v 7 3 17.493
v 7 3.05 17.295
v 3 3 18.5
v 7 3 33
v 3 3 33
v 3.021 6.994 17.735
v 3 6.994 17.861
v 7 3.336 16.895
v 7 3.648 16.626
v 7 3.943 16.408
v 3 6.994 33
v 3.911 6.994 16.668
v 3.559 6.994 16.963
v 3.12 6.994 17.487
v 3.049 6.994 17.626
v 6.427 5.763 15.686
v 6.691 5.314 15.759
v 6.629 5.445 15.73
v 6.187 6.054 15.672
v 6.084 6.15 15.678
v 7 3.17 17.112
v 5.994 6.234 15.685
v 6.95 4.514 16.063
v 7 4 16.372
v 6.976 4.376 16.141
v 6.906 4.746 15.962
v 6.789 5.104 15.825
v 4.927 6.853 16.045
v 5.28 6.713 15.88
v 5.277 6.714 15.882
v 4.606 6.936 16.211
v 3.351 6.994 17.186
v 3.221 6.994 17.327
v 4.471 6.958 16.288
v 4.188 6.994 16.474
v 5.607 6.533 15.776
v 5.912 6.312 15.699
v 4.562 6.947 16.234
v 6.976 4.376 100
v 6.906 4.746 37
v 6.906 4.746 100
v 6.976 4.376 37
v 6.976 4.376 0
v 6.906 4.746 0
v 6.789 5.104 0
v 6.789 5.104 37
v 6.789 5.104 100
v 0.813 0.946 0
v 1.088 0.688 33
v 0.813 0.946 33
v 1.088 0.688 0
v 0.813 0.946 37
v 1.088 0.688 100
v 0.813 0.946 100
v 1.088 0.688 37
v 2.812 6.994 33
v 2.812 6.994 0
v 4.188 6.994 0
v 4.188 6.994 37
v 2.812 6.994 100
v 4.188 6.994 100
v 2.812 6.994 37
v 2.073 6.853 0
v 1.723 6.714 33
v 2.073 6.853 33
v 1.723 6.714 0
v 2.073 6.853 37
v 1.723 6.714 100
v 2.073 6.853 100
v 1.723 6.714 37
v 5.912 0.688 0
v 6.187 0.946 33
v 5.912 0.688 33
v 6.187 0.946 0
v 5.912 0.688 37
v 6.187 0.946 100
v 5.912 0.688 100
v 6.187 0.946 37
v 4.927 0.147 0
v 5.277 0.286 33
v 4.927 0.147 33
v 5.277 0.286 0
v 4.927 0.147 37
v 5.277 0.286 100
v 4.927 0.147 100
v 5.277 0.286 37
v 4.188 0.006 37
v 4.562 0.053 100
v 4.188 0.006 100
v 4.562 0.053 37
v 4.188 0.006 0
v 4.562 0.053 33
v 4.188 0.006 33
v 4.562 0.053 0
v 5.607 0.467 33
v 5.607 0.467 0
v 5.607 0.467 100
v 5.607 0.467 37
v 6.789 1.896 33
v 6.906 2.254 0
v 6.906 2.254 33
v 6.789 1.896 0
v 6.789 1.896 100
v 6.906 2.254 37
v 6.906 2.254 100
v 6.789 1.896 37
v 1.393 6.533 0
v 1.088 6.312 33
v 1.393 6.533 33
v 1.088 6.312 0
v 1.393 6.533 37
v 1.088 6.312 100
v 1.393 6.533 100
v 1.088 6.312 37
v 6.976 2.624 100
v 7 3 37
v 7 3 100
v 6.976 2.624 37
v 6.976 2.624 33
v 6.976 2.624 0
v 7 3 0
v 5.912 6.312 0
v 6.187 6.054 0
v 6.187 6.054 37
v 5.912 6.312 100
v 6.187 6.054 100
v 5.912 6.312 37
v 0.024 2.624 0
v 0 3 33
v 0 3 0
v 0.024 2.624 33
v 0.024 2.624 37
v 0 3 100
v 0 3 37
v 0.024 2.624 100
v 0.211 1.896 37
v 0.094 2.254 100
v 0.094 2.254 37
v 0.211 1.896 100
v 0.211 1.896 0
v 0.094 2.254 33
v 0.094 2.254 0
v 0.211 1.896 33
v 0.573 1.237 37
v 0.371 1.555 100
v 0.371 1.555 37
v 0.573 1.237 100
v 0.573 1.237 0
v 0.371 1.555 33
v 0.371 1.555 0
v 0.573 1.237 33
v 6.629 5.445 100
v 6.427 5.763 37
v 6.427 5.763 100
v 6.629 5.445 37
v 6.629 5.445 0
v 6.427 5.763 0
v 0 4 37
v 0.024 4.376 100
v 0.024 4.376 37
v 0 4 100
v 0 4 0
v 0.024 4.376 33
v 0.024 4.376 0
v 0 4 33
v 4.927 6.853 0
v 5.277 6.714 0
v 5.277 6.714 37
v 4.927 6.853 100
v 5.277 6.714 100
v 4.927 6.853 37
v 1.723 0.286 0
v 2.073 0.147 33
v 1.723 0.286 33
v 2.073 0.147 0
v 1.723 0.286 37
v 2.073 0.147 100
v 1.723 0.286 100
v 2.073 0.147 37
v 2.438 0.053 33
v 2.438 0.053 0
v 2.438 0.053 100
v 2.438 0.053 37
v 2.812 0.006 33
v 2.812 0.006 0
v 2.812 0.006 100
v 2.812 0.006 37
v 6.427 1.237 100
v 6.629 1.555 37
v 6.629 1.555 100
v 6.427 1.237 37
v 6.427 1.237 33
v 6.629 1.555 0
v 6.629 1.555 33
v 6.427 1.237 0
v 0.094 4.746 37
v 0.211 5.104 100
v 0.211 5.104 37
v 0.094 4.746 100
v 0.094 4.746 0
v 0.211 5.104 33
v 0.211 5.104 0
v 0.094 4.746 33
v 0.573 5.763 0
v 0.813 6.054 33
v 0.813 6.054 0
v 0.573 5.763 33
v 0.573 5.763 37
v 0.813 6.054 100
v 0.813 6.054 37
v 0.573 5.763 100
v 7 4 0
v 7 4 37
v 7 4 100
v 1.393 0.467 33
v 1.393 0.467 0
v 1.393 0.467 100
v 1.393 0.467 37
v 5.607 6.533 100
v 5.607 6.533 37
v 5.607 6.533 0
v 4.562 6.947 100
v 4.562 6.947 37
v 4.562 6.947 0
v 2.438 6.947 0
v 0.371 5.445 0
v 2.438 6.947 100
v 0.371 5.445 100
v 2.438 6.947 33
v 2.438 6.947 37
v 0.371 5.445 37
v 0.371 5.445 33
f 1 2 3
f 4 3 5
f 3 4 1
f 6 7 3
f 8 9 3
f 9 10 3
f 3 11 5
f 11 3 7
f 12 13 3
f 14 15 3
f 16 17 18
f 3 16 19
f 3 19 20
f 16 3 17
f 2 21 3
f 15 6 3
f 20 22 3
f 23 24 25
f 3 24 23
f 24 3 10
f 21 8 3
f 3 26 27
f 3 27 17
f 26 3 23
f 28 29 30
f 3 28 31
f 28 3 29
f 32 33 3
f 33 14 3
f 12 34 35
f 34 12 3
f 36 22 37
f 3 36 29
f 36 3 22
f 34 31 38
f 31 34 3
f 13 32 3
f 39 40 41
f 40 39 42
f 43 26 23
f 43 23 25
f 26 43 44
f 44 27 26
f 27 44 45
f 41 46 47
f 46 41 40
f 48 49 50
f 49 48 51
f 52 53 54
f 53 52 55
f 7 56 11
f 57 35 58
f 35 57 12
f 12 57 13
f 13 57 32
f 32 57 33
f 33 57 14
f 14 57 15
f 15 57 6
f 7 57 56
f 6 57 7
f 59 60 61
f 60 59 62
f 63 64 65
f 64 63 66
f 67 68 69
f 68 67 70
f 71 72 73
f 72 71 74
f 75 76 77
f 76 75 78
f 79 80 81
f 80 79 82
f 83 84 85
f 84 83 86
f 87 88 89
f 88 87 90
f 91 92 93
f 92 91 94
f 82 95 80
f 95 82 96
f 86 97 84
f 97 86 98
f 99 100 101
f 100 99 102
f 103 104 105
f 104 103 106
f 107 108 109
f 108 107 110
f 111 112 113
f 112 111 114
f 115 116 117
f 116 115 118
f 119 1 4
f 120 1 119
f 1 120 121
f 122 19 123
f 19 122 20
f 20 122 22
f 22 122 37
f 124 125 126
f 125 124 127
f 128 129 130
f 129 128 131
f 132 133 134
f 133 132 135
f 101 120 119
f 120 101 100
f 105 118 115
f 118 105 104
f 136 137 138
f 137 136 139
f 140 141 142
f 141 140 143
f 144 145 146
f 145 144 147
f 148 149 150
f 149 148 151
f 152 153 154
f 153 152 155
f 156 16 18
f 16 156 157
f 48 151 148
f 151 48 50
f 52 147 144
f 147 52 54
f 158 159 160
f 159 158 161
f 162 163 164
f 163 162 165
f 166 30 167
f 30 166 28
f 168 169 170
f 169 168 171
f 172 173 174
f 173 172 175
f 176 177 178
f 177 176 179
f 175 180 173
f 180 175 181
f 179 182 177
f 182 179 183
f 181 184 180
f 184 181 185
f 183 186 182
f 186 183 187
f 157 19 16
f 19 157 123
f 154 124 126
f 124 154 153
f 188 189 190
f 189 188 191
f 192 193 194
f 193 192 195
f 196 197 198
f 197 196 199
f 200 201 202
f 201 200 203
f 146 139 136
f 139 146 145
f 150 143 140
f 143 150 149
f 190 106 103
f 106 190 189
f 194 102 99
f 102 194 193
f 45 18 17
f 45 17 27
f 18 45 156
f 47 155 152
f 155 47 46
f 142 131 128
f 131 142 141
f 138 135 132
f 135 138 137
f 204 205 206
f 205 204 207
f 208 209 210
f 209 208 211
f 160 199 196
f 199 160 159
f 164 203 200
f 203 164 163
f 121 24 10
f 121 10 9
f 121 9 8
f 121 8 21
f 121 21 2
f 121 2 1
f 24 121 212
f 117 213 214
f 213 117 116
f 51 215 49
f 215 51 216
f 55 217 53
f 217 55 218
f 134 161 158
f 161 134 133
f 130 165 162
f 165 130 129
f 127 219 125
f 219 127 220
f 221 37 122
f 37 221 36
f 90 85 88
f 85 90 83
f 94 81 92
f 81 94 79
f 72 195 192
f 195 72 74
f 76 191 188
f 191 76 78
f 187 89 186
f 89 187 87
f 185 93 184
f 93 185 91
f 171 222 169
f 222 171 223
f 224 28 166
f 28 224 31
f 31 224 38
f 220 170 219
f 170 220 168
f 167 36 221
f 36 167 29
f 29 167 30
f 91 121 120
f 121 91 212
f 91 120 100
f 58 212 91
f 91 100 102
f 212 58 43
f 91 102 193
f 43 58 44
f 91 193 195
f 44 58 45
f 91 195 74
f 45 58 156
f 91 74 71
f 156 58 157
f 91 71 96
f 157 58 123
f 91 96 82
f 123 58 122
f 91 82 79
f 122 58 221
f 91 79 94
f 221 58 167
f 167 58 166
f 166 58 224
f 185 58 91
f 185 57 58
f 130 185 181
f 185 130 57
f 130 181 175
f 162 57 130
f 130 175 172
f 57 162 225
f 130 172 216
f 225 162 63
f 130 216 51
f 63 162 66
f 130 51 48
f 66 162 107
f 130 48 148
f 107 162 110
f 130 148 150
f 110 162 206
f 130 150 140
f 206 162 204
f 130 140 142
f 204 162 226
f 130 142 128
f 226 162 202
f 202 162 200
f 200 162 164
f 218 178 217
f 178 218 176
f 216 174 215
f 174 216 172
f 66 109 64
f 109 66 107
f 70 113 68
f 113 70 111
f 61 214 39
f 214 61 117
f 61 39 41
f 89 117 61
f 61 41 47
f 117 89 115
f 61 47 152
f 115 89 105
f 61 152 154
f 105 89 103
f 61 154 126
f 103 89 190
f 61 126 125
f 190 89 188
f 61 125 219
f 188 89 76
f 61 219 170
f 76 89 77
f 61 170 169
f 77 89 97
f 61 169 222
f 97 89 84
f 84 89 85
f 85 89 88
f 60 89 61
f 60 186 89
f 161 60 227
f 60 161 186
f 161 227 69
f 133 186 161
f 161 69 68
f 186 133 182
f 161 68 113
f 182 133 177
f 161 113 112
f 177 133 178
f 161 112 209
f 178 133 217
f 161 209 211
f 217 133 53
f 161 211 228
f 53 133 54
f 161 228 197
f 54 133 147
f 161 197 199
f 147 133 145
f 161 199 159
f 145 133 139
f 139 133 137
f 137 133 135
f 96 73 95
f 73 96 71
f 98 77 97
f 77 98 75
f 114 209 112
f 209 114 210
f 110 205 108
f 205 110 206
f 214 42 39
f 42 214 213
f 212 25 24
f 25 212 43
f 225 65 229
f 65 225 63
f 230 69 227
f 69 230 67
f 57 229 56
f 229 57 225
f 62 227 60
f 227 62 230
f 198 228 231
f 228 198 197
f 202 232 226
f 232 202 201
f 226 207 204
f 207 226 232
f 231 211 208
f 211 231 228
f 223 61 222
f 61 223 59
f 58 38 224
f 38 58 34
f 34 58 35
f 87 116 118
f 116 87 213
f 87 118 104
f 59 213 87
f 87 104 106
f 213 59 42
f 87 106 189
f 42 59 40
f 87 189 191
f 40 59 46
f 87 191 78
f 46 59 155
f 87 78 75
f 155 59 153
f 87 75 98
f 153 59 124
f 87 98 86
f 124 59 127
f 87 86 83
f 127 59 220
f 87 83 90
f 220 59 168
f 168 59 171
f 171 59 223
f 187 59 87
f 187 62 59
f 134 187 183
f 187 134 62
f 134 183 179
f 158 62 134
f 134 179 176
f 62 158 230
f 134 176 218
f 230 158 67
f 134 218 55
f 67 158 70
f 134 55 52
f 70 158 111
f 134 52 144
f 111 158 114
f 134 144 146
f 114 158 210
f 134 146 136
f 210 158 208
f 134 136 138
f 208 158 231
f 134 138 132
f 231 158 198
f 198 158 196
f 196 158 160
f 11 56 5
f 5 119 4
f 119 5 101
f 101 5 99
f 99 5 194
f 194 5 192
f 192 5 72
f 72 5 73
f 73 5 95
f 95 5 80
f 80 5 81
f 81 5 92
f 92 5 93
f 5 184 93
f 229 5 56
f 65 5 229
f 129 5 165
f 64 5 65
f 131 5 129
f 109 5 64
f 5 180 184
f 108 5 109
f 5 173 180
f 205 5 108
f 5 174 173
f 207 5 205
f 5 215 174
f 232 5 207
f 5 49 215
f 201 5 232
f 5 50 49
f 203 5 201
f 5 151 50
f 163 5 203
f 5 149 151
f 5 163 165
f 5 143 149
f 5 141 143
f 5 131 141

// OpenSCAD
// file: ../../lib/rounded_square.scad
$bleed = 1;
$rounding = 3;

module rounded_square(size) {
  inner_size = [
    size[0] - $rounding * 2,
    size[1] - $rounding * 2,
  ];

  minkowski() {
    translate([$rounding, $rounding, 0]) {
      square(inner_size);
    }
    circle($rounding);
  }
}
// file: ../../lib/util_functions.scad
function sum(v) = [for(p = v) 1] * v;

function take_sum(v, i) = i == 0 
  ? 0 
  : sum([for (a = [0:i-1]) v[a]]);

// input : nested list
// output : list with the outer level nesting removed
function flatten(l) = [ for (a = l) for (b = a) b ] ;
// file: ../../lib/rounded_cube.scad
include <./rounded_square.scad>

$bleed = 1;
$rounding = 3;

// Render a rounded cube
// flat_top: do not round the top edges
// flat_bottom: do not round the bottom edges
// flat: equals flat_top && flat_bottom
// 
// Limitations:
// requires height > $rounding * 2
// flat_top || flat_bottom requires height > $rounding
// flat_top && flat_bottom requires height > $bleed
module rounded_cube(
  size, 
  flat=false, 
  flat_top=false, 
  flat_bottom=false,
  side_rounding=-1
) {
  _flat = flat || (flat_top && flat_bottom);
  _flat_top = flat_top || flat;
  _flat_bottom = flat_bottom || flat;
  _rounding = min($rounding, size[2] / 2);
  _side_rounding = side_rounding > -1 ? side_rounding: $rounding;

  assert(_side_rounding >= $rounding, "side rounding cannot be less than rounding");

  top_height = _flat_top ? 0: _rounding;
  bottom_height = _flat_bottom ? 0: _rounding;

  cube_size = [
    size[0] - _rounding * 2,
    size[1] - _rounding * 2,
    size[2] - (top_height + bottom_height)
  ];

  if (_flat_top && _flat_bottom) {
     linear_extrude(cube_size[2]) {
       rounded_square([size[0], size[1]]);
     }
  } else {
    minkowski() {
      translate([_rounding, _rounding, bottom_height]) {
        if (_side_rounding != _rounding) {
          linear_extrude(cube_size[2]) {
            rounded_square([cube_size[0], cube_size[1]], $rounding=_side_rounding);
          }
        } else {
          cube(cube_size);
        }
      }

      if (_flat_top) {
        difference() {
          sphere(_rounding);
          cylinder(_rounding, _rounding, _rounding);
        }
      } else if (_flat_bottom) {
        difference() {
          sphere(_rounding);
          translate ([0, 0, -_rounding]) {
            cylinder(_rounding, _rounding, _rounding);
          }
        }
      } else {
        sphere(_rounding);
      }
    }
  }
}
// file: ../../lib/grid_dish.scad
include <./dish.scad>
include <./grid_layout.scad>

module grid_dish(grid, pos) {
  translate(grid_offset(grid, pos)) {
    dish(grid_size(grid, pos));
  }
}
// file: ../../lib/dish.scad
include <./rounded_cube.scad>

$rounding = 3;
$bleed = 1;
$lid_height = 2;

default_dish_ratio = 0.5;

module dish (size, dish_ratio=default_dish_ratio, lid=false) {
  width = size[0];
  length = size[1];
  height = size[2];

  r_width = width - $rounding * 2;
  r_length = length - $rounding * 2;
  r_height = height - $rounding * 2;
  cube_ratio = 1 - dish_ratio;

  radius = min(r_width,r_length);

  position = [
    0,
    0,
    lid ? -$lid_height : 0,
  ];

  translate(position) {
    // difference() {
      translate([$rounding,$rounding,$rounding]) {
        // minkowski() {
          hull() {
            translate([0,0,height * dish_ratio - $rounding]) {
              cube([r_width,r_length,height * cube_ratio]);
            }
            translate([r_width/2,r_length/2,height * dish_ratio / 2]) {
              resize([r_width,r_length,height * dish_ratio]) {
                sphere(radius);
              }
            }
          }
          // sphere($rounding);
        // }
      }

      translate([-$bleed,-$bleed,height]) {
        /*
        cube([
          width + $bleed * 2,
          length + $bleed * 2,
          $rounding + $bleed
        ]);
        */
      }
    }
  // }
}
// file: ../../lib/grid_layout.scad
include <./util_functions.scad>

$wall_thickness = 2;

function total_wall_size(count = 1) = (count + 1) * $wall_thickness;

function usable_size(size, count = 1) = size - total_wall_size(count);

function item_size(size, count = 1, i = 0) = usable_size(size, count) / count;

function axis_offset(v, i) = take_sum(v, i) + $wall_thickness * i;

// Get the offset to place the item at the given grid position
function grid_offset(grid, pos) = [
  axis_offset(grid[0], pos[0] ? pos[0] : 0), 
  axis_offset(grid[1], pos[1] ? pos[1] : 0), 
  axis_offset(grid[2], pos[2] ? pos[2] : 0), 
];

// Get the size of the item at given grid position
function grid_size(grid, pos) = [
  grid[0][pos[0] ? pos[0]: 0],
  grid[1][pos[1] ? pos[1]: 0],
  grid[2][pos[2] ? pos[2]: 0],
];

// Make an evenly split grid
function make_even_grid(size, cols, rows) = [
  [for (i=[0:cols-1]) item_size(size[0], cols)],
  [for (i=[0:rows-1]) item_size(size[1], rows)],
  [size[2]],
];

// TODO items that take 100% of an axis wont ever have a value
// totally unable to handle differing rows / columns
// revert to lower level functions for manual placements
// file: ../../lib/cutout_tray.scad
include <./rounded_cube.scad>

$bleed = 1;
$rounding = 3;
$wall_thickness = 2;

module cutout_tray(size) {
  width = size[0];
  length = size[1];
  height = size[2];

  difference() {
    // Base tray
    rounded_cube(width, length, height+$rounding+$bleed);

    // Cutouts
    translate([0, 0, $wall_thickness]) {
      children();
    }
 
    // Slice off top
    translate([-$bleed,-$bleed,height]) {
      cube([
        width + $bleed * 2, 
        length + $bleed * 2, 
        $rounding + $bleed
      ]);
    }
  }
}
// main file
echo(version=version());

include <../../lib/cutout_tray.scad>
include <../../lib/grid_layout.scad>
include <../../lib/dish.scad>
include <../../lib/grid_dish.scad>

// Config
$fn = 50;
$wall_thickness = 2;

// Attributes
size = [
  54.5,
  187,
  33,
];
large_dish_share = 0.4;
cols = 3;

// Derived attributes
usable_length = usable_size(size[1], cols);
large_dish_length = usable_length * large_dish_share;
small_dish_length = (usable_length - large_dish_length) / (cols - 1);

grid = [
  [item_size(size[0])],
  [
    large_dish_length, 
    for (i=[0:cols-2]) small_dish_length,
  ],
  [size[2]],
];

large_dish_cell = [0, 0];
small_dish_cells = [for (i = [0:cols-2]) [0,i+1]];

// Model
cutout_tray(size) {
  grid_dish(grid, large_dish_cell);

  for (i=[0:cols-2]) grid_dish(grid, small_dish_cells[i]);
}
